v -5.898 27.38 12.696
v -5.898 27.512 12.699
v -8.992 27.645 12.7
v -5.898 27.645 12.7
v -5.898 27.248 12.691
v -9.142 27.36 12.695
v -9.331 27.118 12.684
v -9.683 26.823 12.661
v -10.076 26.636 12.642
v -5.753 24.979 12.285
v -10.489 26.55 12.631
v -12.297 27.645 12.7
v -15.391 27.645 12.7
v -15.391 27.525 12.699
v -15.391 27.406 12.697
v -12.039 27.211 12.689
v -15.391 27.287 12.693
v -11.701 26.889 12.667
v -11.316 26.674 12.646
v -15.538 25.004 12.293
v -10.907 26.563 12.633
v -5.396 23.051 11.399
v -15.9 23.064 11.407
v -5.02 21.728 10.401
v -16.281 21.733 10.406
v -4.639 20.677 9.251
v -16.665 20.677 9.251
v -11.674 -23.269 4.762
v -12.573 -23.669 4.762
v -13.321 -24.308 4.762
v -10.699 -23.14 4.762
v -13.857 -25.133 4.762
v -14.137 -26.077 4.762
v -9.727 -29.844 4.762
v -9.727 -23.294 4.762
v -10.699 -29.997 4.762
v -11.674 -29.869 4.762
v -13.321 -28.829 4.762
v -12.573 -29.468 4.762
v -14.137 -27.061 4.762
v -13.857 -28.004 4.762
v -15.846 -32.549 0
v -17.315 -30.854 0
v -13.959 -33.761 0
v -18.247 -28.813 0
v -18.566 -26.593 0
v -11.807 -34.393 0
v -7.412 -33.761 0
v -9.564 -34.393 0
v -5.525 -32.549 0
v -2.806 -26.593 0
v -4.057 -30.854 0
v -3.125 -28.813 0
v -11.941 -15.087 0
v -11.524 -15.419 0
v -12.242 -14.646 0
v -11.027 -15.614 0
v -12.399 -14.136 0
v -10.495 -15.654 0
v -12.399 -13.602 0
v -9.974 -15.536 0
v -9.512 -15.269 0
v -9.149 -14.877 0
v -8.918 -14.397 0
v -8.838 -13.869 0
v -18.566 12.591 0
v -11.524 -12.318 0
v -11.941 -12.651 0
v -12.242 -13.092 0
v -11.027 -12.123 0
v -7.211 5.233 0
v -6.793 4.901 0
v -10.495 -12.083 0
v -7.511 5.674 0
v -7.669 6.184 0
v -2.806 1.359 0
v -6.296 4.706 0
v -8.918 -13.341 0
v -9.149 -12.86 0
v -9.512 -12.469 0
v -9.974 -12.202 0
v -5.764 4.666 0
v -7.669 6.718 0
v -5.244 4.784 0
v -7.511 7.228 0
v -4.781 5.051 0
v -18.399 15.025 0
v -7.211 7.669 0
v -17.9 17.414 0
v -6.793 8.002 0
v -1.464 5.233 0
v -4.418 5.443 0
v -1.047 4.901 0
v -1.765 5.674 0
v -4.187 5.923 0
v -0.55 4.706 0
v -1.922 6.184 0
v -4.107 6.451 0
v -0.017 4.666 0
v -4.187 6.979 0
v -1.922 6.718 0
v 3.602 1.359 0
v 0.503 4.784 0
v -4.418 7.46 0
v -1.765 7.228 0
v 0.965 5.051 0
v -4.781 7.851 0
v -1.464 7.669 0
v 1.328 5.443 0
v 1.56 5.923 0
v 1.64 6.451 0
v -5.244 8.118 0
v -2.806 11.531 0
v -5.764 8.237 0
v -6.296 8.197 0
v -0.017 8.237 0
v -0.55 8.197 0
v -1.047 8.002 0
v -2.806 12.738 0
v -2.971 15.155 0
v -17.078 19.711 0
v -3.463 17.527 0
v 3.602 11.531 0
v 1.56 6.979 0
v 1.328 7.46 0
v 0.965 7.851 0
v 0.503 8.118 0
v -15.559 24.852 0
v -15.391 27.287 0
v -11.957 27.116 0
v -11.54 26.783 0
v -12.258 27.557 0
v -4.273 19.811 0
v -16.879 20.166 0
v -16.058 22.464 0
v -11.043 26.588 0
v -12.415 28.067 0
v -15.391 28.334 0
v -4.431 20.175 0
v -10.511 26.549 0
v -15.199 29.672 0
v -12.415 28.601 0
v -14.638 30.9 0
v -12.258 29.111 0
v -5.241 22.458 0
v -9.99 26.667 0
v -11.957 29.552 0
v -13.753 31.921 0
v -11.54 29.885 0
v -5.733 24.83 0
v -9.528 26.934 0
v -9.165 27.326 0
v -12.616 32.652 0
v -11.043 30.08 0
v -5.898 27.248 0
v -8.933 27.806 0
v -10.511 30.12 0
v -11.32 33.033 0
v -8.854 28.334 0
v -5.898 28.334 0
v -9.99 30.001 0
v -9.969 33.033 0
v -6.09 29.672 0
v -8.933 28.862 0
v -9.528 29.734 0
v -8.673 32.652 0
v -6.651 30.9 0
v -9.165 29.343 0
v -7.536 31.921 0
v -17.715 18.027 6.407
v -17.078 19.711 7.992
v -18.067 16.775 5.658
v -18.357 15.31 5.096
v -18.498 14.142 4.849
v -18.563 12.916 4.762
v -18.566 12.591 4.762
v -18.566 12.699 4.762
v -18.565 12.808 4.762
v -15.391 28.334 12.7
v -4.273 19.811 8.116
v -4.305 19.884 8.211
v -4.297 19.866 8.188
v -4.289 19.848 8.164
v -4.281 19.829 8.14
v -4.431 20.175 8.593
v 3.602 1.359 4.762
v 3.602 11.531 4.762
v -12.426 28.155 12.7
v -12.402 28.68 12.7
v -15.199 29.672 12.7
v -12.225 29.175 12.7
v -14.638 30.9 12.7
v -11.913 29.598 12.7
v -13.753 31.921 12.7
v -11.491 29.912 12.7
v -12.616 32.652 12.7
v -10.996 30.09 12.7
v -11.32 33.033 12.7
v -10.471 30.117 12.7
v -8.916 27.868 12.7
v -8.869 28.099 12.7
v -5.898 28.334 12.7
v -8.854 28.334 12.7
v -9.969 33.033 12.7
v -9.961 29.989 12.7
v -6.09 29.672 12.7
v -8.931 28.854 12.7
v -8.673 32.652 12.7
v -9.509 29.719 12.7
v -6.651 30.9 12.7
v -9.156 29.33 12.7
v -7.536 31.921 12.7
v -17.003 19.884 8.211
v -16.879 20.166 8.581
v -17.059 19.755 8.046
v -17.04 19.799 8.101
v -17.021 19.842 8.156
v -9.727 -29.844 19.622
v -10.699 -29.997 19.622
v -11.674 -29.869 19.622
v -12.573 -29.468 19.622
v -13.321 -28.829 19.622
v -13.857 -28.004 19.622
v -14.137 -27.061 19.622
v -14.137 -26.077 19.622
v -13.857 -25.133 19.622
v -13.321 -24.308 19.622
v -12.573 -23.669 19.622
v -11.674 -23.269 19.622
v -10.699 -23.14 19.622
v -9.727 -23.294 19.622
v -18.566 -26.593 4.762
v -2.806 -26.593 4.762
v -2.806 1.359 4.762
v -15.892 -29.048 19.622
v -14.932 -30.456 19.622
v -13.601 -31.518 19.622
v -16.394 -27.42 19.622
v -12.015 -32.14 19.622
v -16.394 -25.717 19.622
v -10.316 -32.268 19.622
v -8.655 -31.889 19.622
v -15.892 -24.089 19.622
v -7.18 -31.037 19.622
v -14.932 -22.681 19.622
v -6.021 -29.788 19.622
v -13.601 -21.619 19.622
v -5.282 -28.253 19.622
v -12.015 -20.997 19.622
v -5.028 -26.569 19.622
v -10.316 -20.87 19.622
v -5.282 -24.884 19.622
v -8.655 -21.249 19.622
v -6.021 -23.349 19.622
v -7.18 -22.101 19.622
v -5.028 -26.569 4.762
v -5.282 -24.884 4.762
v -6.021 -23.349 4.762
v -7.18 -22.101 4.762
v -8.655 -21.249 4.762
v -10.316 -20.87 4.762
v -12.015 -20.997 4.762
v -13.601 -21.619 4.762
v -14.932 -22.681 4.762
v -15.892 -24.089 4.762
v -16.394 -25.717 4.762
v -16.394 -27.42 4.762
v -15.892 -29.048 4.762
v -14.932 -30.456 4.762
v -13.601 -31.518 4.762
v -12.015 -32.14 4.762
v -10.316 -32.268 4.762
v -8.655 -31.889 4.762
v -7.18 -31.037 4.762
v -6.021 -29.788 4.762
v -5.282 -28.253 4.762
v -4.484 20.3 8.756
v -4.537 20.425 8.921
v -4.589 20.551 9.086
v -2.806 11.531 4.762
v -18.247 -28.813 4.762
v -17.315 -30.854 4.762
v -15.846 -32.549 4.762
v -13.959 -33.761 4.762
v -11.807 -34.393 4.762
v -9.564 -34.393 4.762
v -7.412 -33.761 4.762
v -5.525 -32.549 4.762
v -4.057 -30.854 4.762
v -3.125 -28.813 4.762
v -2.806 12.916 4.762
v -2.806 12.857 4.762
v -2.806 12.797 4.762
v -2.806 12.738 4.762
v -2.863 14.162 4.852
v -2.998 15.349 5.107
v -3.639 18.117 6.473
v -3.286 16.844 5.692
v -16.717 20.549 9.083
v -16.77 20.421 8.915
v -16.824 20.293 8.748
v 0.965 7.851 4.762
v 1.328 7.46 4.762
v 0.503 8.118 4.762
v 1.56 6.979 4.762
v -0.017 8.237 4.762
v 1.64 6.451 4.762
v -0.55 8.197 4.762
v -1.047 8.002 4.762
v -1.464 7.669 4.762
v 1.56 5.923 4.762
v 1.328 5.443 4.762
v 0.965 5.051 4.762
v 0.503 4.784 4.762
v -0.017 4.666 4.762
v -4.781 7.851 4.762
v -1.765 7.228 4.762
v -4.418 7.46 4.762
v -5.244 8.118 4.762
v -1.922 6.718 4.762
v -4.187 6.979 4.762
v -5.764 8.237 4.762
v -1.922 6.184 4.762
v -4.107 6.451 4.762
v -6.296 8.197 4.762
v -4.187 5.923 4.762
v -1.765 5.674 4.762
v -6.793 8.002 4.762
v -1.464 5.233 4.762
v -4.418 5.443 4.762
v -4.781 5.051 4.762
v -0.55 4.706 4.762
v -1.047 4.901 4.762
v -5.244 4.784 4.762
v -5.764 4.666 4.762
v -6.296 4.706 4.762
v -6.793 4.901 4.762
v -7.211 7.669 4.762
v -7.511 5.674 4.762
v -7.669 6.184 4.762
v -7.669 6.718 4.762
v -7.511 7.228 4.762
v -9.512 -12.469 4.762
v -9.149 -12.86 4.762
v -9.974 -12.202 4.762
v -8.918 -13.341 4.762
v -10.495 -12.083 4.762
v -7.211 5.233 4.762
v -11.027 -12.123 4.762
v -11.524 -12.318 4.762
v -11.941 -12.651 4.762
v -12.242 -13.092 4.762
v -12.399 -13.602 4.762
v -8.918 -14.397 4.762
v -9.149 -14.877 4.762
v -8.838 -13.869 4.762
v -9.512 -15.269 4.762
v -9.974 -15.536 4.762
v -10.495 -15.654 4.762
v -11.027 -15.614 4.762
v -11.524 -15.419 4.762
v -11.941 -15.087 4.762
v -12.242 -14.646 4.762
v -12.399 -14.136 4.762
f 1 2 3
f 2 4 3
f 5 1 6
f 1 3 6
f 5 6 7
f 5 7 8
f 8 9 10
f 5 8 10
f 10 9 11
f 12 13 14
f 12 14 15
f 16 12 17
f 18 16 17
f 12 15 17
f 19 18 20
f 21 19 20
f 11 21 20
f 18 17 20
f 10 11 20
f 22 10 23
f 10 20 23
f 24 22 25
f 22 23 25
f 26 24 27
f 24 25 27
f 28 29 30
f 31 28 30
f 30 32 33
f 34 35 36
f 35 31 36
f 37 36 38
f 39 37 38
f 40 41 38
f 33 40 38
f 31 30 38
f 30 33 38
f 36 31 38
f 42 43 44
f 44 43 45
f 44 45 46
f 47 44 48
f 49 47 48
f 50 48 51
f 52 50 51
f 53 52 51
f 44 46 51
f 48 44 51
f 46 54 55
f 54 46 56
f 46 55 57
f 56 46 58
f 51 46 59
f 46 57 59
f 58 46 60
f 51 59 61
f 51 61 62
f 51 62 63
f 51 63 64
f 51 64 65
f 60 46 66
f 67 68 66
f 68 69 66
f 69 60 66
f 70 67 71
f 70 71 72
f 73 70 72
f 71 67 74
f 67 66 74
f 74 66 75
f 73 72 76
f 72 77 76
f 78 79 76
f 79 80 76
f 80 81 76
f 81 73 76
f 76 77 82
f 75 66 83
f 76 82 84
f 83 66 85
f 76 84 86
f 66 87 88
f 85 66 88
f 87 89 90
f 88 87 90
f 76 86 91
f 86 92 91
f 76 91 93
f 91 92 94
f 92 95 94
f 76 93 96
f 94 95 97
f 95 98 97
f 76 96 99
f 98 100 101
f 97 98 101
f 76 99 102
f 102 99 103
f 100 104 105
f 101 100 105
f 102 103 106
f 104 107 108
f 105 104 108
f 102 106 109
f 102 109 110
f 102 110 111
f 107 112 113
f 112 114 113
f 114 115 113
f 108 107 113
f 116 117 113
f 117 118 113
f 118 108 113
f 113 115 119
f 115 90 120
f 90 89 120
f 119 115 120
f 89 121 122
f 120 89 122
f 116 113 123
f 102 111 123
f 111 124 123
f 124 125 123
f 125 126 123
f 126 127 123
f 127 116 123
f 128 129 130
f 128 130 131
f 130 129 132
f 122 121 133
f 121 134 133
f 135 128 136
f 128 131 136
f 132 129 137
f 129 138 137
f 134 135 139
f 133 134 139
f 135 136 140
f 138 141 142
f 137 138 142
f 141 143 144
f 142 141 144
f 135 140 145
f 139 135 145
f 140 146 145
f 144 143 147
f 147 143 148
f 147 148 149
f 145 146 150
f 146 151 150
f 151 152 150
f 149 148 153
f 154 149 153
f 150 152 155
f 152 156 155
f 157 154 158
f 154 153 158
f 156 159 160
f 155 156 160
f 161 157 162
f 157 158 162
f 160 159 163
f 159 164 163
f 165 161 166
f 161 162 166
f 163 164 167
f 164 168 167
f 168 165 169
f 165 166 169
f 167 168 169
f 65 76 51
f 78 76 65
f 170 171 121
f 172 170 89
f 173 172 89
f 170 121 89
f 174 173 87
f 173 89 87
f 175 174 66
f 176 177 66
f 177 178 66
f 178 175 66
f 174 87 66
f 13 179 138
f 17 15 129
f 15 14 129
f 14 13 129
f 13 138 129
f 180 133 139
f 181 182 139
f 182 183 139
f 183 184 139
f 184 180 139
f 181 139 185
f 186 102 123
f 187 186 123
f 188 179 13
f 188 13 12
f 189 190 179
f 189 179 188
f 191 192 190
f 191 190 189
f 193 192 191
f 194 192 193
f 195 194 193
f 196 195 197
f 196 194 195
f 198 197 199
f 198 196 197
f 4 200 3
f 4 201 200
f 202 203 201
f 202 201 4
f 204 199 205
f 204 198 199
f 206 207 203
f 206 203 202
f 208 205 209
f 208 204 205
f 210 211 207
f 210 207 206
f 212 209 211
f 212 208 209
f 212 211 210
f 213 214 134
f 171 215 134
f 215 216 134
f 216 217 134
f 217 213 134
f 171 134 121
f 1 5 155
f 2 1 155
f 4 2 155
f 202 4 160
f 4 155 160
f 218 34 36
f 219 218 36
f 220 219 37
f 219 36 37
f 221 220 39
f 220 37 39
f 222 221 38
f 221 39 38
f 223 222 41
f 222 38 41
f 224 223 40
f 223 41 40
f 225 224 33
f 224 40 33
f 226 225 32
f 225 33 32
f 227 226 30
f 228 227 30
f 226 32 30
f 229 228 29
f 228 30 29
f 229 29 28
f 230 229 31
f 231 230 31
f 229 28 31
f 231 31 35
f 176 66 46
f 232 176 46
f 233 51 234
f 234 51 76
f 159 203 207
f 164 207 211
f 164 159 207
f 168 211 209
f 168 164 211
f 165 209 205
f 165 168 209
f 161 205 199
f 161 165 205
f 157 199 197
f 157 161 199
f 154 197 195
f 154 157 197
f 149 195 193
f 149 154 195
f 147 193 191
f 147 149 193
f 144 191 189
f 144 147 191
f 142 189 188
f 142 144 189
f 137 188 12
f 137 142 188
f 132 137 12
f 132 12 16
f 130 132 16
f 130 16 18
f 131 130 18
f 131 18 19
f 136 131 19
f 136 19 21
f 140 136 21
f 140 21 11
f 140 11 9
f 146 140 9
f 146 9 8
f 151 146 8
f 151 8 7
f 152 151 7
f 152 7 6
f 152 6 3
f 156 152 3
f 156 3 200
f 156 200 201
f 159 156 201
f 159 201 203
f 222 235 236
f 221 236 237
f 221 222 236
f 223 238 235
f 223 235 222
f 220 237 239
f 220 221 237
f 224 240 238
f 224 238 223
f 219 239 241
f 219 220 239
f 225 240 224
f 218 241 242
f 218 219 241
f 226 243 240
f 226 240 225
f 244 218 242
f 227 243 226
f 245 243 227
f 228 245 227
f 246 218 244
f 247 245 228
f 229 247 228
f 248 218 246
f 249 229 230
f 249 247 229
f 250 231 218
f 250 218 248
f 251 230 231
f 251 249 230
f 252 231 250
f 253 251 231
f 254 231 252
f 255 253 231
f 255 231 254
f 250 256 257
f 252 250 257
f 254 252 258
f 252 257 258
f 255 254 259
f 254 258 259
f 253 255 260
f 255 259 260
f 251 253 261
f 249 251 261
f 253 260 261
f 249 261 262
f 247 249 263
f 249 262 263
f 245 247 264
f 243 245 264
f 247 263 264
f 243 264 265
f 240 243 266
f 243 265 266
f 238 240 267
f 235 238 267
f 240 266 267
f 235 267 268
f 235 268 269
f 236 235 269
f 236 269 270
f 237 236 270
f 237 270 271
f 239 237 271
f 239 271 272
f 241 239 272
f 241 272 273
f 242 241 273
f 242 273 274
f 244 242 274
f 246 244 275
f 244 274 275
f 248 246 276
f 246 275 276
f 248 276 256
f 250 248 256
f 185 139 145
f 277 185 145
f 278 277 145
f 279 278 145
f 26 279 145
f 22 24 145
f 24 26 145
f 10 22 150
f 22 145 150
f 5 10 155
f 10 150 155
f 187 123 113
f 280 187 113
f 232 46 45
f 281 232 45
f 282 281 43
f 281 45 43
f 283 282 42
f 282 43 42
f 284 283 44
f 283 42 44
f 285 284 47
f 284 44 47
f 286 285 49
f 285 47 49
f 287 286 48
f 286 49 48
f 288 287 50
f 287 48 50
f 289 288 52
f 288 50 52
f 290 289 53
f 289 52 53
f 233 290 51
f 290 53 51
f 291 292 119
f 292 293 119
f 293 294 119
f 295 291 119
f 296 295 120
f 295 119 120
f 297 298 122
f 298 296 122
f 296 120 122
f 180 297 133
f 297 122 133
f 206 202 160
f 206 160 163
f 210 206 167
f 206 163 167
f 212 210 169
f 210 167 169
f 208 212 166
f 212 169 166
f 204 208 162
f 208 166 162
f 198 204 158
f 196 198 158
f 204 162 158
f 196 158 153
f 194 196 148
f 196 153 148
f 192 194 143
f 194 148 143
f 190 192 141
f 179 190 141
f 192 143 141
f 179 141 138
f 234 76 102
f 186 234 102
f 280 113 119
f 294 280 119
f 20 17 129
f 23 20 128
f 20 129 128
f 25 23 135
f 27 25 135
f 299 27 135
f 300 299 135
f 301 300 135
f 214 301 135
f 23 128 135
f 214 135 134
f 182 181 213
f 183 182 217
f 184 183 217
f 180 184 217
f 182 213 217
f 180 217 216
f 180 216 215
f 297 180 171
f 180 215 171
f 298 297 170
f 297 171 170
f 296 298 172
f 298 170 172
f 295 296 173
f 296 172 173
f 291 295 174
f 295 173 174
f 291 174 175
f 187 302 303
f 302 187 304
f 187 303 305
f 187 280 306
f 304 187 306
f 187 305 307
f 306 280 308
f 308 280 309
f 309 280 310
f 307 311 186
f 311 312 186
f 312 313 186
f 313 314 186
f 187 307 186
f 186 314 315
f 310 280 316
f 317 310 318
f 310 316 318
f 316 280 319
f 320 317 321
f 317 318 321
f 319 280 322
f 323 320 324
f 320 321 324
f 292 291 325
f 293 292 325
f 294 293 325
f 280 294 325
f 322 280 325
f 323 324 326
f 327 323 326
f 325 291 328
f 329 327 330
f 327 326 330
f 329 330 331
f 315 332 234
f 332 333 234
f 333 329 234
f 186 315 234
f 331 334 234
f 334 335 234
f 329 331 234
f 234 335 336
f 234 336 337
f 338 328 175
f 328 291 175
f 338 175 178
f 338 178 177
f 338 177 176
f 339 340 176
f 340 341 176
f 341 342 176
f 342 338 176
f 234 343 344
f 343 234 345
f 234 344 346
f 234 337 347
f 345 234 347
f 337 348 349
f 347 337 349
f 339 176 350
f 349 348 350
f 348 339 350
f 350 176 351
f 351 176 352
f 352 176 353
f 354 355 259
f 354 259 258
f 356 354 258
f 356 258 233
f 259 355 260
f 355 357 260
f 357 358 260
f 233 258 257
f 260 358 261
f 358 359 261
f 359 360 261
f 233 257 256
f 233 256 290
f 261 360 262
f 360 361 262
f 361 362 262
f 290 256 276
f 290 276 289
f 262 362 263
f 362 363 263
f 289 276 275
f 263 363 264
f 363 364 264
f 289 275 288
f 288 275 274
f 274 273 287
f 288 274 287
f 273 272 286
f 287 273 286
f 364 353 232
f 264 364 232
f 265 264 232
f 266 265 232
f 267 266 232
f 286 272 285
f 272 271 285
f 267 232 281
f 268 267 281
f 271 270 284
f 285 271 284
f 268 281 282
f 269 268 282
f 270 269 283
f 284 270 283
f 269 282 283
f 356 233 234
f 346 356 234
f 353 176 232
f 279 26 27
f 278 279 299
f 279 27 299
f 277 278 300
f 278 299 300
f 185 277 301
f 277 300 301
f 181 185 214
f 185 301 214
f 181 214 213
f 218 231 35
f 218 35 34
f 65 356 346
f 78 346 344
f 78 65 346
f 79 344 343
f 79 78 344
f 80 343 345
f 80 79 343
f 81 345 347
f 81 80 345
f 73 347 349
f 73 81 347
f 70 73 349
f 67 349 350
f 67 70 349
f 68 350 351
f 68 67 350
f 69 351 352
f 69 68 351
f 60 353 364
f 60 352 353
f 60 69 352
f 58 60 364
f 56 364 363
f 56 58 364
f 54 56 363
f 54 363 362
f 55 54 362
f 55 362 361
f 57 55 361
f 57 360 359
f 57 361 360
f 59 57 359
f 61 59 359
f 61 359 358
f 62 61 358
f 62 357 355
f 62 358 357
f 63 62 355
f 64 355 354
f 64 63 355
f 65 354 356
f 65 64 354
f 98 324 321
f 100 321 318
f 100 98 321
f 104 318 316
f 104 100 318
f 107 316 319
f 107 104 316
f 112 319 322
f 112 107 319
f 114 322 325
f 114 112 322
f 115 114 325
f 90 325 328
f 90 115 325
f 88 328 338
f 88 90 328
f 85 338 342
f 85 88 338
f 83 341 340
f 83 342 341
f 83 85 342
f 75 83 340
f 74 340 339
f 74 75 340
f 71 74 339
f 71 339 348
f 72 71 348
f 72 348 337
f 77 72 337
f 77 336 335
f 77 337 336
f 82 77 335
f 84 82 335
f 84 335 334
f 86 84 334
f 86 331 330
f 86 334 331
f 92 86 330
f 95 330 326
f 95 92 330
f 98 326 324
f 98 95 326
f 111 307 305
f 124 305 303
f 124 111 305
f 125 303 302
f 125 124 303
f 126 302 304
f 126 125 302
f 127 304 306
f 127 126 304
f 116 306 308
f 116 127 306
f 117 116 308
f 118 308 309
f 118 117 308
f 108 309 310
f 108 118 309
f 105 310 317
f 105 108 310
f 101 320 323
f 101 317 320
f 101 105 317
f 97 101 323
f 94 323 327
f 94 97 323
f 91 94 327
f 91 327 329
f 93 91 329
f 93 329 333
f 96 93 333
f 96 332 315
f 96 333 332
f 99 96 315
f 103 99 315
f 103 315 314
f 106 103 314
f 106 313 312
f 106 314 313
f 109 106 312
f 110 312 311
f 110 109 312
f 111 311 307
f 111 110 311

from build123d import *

# Parameters (mm, degrees)
SKETCH1_R           = 1.7907
BOSS_EXTRUDE1_DEPTH = 12.7
CUT_EXTRUDE1_DEPTH  = 43.908371508
SKETCH6_R           = 5.715
BOSS_EXTRUDE2_DEPTH = 14.859


with BuildPart() as part:
    # Sketch1 → Boss-Extrude1 (new body)
    with BuildSketch(Plane.XY):
        with BuildLine():
            ThreePointArc((-5.89797239, 28.334249775), (-10.644578231, 33.080855616), (-15.391184073, 28.334249775))
            Line((-15.391184073, 28.334249775), (-15.391184073, 27.2867057))
            ThreePointArc((-15.391184073, 27.2867057), (-15.767187067, 23.64949685), (-16.879292984, 20.16612393))
            Line((-16.879292984, 20.16612393), (-17.078075162, 19.711310306))
            ThreePointArc((-17.078075162, 19.711310306), (-18.190181079, 16.227937386), (-18.566184073, 12.590728536))
            Line((-18.566184073, 12.590728536), (-18.566184073, -26.593250225))
            ThreePointArc((-18.566184073, -26.593250225), (-10.68587239, -34.473561908), (-2.805560707, -26.593250225))
            Line((-2.805560707, -26.593250225), (-2.805560707, 1.359449775))
            Line((-2.805560707, 1.359449775), (3.60162761, 1.359449775))
            Line((3.60162761, 1.359449775), (3.60162761, 11.531317118))
            Line((3.60162761, 11.531317118), (-2.805560707, 11.531317118))
            Line((-2.805560707, 11.531317118), (-2.805560707, 12.738028185))
            ThreePointArc((-2.805560707, 12.738028185), (-3.176236758, 16.349653807), (-4.272809259, 19.810689652))
            Line((-4.272809259, 19.810689652), (-4.430723837, 20.174911983))
            ThreePointArc((-4.430723837, 20.174911983), (-5.527296339, 23.635947828), (-5.89797239, 27.24757345))
            Line((-5.89797239, 27.24757345), (-5.89797239, 28.334249775))
        make_face()
        with Locations((-10.644578231, 28.334249775)):
            Circle(SKETCH1_R, mode=Mode.SUBTRACT)
        with Locations((-0.151184073, 6.451317118)):
            Circle(SKETCH1_R, mode=Mode.SUBTRACT)
        with Locations((-10.628684073, -13.868682882)):
            Circle(SKETCH1_R, mode=Mode.SUBTRACT)
        with Locations((-5.89797239, 6.451317118)):
            Circle(SKETCH1_R, mode=Mode.SUBTRACT)
    extrude(amount=BOSS_EXTRUDE1_DEPTH)

    # Sketch5 → Cut-Extrude1 (cut, through all)
    with BuildSketch(Plane.ZY.offset(18.566184073)):
        with BuildLine():
            Line((4.7625, -34.473561908), (12.7, -34.473561908))
            Line((12.7, -34.473561908), (12.7, 27.644937325))
            ThreePointArc((12.7, 27.644937325), (11.790590228, 23.757613113), (9.251115022, 20.677129167))
            Line((9.251115022, 20.677129167), (8.211384978, 19.88416172))
            ThreePointArc((8.211384978, 19.88416172), (5.671909772, 16.803677773), (4.7625, 12.916353561))
            Line((4.7625, 12.916353561), (4.7625, -34.473561908))
        make_face()
    extrude(amount=-CUT_EXTRUDE1_DEPTH, mode=Mode.SUBTRACT)

    # Sketch6 → Boss-Extrude2 (add)
    with BuildSketch(Plane.XY.offset(4.7625)):
        with Locations((-10.743060707, -26.568682882)):
            Circle(SKETCH6_R)
        with BuildLine():
            Line((-9.727060707, -23.293658454), (-9.727060707, -29.843707309))
            ThreePointArc((-9.727060707, -29.843707309), (-14.172060707, -26.568682882), (-9.727060707, -23.293658454))
        make_face(mode=Mode.SUBTRACT)
    extrude(amount=BOSS_EXTRUDE2_DEPTH)


solid = part.part
